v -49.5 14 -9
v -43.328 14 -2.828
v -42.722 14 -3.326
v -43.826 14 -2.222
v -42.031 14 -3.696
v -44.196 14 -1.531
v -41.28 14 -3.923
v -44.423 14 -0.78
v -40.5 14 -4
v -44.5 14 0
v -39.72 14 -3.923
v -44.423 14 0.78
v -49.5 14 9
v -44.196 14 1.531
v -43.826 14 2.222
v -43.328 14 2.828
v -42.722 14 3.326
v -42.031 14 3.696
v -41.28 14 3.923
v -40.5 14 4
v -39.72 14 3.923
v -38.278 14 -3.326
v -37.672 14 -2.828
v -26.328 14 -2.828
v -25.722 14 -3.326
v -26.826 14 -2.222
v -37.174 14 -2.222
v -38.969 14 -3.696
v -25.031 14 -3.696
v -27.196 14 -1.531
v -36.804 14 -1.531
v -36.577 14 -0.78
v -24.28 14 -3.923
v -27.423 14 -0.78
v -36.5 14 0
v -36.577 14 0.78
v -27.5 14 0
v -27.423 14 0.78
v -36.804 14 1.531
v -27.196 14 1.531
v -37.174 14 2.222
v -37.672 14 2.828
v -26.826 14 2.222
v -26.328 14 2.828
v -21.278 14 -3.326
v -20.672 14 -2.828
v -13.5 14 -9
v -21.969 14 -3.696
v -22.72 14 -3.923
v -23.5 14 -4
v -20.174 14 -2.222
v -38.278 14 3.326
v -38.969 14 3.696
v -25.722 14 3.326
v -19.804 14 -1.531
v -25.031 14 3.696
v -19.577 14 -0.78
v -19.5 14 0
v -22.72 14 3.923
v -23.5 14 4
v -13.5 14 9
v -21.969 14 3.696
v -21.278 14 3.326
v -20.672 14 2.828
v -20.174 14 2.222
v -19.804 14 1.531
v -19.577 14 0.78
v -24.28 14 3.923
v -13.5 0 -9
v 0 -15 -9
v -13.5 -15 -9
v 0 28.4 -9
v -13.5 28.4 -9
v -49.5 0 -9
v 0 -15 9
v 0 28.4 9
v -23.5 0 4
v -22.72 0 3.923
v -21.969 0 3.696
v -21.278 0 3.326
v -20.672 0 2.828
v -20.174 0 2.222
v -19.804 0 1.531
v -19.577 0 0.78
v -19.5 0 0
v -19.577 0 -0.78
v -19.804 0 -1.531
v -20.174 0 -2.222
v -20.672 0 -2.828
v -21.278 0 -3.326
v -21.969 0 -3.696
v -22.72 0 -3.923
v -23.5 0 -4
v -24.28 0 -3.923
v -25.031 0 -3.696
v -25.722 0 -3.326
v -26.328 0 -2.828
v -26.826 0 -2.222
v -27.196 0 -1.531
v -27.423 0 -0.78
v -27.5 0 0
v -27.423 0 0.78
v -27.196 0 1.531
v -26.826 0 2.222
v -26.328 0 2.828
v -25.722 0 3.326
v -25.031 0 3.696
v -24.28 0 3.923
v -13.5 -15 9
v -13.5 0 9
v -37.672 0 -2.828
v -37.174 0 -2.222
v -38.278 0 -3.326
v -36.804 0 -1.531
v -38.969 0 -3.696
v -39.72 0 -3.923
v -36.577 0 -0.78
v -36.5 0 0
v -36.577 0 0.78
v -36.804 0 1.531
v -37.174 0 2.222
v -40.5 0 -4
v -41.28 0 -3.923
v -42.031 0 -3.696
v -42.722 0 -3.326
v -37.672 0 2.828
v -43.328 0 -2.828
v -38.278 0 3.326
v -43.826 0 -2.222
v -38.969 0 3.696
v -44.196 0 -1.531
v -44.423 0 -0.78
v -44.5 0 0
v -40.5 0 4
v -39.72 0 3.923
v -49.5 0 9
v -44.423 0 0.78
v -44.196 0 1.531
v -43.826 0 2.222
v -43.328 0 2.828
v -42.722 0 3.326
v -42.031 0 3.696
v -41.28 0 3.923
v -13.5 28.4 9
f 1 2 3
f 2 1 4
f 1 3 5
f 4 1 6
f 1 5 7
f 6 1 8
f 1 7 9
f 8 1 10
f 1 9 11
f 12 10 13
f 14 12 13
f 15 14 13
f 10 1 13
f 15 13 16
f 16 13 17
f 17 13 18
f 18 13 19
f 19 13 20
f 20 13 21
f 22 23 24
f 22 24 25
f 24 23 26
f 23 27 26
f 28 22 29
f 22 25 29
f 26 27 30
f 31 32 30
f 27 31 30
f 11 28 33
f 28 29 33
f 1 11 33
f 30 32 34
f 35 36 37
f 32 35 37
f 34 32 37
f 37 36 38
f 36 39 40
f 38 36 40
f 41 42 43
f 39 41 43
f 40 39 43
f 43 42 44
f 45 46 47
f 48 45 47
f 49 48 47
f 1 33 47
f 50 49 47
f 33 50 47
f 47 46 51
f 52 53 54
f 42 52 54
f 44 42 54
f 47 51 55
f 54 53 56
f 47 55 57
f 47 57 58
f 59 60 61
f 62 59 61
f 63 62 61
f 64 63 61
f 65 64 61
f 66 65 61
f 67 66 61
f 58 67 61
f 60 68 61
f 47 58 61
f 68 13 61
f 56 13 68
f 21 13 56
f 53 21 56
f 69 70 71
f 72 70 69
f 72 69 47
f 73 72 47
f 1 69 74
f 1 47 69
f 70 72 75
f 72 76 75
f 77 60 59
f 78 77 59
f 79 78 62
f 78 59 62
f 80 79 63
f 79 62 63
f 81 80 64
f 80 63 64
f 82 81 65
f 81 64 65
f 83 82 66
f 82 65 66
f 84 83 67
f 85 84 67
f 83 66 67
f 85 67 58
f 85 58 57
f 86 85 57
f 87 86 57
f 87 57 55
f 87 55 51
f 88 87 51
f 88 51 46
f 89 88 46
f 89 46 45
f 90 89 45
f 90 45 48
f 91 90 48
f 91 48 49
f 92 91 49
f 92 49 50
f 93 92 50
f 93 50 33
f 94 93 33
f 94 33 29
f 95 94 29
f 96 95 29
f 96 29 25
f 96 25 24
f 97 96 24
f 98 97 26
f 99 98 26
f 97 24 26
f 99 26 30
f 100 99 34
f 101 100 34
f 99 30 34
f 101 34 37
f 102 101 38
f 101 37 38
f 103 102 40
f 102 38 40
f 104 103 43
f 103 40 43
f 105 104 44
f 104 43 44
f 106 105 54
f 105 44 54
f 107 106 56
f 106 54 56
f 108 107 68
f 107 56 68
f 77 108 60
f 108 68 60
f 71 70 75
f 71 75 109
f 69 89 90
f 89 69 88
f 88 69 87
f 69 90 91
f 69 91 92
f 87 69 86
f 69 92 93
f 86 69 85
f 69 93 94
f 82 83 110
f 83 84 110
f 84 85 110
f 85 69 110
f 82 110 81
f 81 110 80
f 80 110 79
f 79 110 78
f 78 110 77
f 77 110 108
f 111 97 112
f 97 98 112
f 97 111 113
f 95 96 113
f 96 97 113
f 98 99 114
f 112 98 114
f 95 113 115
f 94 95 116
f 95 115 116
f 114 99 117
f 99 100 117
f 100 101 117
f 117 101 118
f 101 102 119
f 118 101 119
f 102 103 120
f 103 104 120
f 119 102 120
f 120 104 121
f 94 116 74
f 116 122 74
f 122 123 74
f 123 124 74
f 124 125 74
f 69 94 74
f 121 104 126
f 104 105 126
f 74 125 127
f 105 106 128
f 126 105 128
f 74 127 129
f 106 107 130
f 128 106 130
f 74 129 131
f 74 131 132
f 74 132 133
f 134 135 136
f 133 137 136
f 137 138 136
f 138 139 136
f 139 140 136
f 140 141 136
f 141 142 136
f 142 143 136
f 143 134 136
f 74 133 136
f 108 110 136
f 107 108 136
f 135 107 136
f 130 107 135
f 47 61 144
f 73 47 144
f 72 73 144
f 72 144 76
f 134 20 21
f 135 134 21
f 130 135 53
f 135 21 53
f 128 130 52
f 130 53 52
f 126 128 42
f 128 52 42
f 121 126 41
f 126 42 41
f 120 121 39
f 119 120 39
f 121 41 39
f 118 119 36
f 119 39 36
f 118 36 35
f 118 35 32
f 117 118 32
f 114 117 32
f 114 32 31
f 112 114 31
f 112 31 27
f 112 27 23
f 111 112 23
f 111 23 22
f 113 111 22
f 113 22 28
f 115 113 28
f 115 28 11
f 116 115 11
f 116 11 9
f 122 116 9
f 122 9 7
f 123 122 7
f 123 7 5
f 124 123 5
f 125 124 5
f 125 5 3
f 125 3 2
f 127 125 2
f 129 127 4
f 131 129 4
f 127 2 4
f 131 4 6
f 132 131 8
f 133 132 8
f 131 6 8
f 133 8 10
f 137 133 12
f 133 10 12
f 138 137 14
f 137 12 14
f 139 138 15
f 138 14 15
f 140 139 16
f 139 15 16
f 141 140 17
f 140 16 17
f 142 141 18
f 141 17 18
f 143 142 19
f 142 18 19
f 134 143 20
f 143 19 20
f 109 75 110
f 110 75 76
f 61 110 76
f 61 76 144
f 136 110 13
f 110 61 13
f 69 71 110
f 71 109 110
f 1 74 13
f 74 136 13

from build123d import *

# Parameters (mm, degrees)
BODY_DEPTH   = 9
SK_HOLE_V_R  = 4
HOLE_V_DEPTH = 59.071077138


with BuildPart() as part:
    # sk-body → body (new, symmetric)
    with BuildSketch(Plane.XY):
        Polygon((-13.5, 28.4), (0, 28.4), (0, -15), (-13.5, -15), (-13.5, 0), (-49.5, 0), (-49.5, 14), (-13.5, 14), align=None)
    extrude(amount=BODY_DEPTH, both=True)

    # sk-hole_v → hole_v (cut, through all)
    with BuildSketch(Plane(origin=(0, 14, 0), x_dir=(-1, 0, 0), z_dir=(0, 1, 0))):
        with Locations(Location((40.5, 0, 0), (0, 0, 90))):
            Circle(SK_HOLE_V_R)
        with Locations(Location((23.5, 0, 0), (0, 0, 90))):
            Circle(SK_HOLE_V_R)
    extrude(amount=-HOLE_V_DEPTH, mode=Mode.SUBTRACT)


solid = part.part
